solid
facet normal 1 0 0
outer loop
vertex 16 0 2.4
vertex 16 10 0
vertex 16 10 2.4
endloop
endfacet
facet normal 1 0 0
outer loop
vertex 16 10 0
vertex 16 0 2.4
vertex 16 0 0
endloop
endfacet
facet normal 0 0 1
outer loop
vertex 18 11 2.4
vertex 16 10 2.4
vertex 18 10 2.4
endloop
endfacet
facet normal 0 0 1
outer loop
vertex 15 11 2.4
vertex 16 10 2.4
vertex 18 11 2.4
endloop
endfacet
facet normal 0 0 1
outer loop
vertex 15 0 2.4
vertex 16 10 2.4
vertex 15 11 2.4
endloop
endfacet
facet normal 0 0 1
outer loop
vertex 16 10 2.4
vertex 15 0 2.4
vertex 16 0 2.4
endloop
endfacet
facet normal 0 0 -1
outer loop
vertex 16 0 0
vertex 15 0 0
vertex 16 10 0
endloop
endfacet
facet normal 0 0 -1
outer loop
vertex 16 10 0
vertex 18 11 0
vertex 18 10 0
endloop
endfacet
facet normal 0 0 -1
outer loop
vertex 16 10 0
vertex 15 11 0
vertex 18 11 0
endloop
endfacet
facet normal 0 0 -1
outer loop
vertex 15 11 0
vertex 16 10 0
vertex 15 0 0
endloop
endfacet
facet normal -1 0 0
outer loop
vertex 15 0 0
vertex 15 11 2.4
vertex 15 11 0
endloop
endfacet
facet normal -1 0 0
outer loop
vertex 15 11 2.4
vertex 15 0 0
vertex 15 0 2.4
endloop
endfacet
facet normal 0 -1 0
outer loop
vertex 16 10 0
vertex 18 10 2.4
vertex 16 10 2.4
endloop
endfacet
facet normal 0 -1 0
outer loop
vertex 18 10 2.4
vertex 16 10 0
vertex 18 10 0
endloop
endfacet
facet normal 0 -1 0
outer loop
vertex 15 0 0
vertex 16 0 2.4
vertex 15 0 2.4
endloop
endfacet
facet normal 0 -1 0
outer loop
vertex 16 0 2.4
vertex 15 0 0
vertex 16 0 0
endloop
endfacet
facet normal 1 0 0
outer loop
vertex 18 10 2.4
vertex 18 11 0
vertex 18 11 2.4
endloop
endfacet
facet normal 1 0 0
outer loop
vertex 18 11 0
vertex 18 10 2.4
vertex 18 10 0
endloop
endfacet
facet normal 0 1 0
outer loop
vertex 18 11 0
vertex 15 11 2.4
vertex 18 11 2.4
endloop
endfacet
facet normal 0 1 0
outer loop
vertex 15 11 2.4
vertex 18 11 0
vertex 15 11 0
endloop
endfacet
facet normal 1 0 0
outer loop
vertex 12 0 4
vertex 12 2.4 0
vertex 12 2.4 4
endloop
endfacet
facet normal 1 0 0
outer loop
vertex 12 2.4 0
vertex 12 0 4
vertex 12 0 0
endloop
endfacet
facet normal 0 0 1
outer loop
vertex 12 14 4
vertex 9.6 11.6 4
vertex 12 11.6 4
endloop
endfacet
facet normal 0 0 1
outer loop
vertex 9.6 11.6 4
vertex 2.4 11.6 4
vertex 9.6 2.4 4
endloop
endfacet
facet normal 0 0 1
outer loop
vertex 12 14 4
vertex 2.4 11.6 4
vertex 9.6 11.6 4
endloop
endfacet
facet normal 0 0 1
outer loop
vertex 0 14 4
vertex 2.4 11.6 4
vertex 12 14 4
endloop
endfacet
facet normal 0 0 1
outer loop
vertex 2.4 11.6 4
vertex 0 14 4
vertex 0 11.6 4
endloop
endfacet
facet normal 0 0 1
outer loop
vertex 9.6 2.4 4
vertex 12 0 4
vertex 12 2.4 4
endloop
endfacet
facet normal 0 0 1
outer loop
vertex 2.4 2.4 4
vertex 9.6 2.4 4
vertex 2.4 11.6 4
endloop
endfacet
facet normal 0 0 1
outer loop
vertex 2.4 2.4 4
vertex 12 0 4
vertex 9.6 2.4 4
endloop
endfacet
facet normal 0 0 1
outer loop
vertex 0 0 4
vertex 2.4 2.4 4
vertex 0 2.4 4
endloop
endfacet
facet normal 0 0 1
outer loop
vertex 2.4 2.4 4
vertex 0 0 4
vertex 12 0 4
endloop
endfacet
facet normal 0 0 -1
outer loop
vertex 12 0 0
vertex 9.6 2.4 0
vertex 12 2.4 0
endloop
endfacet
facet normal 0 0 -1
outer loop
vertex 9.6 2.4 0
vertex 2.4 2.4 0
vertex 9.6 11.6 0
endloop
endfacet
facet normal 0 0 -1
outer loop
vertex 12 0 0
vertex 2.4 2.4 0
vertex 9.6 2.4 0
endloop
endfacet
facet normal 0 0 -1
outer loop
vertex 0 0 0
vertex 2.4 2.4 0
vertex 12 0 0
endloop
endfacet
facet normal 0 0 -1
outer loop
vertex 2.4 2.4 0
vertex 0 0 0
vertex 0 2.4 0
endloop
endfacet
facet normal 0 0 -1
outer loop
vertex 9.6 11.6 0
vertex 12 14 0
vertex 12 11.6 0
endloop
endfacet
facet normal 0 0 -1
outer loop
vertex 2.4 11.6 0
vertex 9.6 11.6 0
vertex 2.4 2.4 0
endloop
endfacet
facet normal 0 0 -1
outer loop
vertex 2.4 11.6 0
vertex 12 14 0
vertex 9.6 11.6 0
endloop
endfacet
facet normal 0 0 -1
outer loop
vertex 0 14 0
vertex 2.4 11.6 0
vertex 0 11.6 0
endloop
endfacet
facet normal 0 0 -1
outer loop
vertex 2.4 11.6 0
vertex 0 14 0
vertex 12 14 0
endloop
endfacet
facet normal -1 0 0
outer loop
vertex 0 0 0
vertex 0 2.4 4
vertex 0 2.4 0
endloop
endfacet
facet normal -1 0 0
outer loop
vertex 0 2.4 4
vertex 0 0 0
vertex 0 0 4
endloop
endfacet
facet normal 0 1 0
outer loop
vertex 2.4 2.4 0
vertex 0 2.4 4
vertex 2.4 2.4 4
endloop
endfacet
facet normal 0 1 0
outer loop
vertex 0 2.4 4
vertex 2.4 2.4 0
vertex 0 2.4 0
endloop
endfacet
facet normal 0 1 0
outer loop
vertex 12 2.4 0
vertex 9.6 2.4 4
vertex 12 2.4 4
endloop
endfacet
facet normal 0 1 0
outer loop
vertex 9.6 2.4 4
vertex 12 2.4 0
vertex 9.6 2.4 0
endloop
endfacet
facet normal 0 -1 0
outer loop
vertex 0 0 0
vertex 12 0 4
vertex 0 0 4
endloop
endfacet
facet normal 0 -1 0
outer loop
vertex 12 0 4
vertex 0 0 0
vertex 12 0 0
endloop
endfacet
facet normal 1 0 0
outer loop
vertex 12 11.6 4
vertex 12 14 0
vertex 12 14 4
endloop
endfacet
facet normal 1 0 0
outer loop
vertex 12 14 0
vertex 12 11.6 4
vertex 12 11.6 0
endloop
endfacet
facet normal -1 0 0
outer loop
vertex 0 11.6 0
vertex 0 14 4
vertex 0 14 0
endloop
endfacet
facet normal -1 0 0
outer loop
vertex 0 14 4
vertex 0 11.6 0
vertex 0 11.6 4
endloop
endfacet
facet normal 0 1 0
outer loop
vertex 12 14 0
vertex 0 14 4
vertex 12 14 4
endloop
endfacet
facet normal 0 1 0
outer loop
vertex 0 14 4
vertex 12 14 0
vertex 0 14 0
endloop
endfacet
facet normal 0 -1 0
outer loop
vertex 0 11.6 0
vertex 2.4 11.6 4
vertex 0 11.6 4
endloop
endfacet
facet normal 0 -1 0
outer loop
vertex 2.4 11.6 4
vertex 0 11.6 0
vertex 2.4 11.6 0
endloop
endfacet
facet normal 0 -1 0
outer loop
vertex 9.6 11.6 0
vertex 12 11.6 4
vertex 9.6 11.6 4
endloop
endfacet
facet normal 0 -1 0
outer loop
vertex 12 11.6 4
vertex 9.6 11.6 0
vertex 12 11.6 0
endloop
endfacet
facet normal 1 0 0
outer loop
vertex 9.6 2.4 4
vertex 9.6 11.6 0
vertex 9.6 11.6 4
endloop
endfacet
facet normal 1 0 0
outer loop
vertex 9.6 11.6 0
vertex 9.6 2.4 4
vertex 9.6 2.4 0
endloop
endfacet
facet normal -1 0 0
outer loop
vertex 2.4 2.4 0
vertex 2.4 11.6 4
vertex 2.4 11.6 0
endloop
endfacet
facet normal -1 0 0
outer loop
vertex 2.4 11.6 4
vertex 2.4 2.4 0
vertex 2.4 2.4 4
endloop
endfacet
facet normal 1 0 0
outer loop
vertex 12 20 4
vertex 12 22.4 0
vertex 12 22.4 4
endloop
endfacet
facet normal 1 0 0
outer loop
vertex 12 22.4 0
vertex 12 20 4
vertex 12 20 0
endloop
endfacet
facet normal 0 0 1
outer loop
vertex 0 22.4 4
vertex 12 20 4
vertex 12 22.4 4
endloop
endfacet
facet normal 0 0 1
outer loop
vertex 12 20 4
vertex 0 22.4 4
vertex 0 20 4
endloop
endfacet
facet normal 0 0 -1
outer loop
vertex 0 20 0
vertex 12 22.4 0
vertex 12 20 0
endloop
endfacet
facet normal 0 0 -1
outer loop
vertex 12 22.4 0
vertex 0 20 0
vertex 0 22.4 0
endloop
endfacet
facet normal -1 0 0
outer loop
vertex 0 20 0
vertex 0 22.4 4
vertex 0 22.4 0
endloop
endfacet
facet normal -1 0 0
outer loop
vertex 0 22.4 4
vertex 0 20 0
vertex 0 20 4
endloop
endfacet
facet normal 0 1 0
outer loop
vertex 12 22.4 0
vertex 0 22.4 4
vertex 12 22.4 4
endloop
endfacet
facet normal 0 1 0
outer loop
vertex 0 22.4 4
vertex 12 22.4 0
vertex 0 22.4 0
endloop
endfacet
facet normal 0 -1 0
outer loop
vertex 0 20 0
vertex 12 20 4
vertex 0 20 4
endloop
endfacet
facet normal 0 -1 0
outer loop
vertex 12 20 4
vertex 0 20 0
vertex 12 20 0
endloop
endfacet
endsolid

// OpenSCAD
cube(size=[12,2.4,4]);

translate(v=[0,14-2.4,0])
  cube(size=[12,2.4,4]);

translate(v=[2.4,0,0])
  cube(size=[7.2,12,4]);

translate(v=[0,20,0])
  cube(size=[12,2.4,4]);

translate(v=[15,0,0])
{
  cube(size=[1,10,2.4]);
  translate(v=[0,10,0])
    cube(size=[3,1,2.4]);
}
